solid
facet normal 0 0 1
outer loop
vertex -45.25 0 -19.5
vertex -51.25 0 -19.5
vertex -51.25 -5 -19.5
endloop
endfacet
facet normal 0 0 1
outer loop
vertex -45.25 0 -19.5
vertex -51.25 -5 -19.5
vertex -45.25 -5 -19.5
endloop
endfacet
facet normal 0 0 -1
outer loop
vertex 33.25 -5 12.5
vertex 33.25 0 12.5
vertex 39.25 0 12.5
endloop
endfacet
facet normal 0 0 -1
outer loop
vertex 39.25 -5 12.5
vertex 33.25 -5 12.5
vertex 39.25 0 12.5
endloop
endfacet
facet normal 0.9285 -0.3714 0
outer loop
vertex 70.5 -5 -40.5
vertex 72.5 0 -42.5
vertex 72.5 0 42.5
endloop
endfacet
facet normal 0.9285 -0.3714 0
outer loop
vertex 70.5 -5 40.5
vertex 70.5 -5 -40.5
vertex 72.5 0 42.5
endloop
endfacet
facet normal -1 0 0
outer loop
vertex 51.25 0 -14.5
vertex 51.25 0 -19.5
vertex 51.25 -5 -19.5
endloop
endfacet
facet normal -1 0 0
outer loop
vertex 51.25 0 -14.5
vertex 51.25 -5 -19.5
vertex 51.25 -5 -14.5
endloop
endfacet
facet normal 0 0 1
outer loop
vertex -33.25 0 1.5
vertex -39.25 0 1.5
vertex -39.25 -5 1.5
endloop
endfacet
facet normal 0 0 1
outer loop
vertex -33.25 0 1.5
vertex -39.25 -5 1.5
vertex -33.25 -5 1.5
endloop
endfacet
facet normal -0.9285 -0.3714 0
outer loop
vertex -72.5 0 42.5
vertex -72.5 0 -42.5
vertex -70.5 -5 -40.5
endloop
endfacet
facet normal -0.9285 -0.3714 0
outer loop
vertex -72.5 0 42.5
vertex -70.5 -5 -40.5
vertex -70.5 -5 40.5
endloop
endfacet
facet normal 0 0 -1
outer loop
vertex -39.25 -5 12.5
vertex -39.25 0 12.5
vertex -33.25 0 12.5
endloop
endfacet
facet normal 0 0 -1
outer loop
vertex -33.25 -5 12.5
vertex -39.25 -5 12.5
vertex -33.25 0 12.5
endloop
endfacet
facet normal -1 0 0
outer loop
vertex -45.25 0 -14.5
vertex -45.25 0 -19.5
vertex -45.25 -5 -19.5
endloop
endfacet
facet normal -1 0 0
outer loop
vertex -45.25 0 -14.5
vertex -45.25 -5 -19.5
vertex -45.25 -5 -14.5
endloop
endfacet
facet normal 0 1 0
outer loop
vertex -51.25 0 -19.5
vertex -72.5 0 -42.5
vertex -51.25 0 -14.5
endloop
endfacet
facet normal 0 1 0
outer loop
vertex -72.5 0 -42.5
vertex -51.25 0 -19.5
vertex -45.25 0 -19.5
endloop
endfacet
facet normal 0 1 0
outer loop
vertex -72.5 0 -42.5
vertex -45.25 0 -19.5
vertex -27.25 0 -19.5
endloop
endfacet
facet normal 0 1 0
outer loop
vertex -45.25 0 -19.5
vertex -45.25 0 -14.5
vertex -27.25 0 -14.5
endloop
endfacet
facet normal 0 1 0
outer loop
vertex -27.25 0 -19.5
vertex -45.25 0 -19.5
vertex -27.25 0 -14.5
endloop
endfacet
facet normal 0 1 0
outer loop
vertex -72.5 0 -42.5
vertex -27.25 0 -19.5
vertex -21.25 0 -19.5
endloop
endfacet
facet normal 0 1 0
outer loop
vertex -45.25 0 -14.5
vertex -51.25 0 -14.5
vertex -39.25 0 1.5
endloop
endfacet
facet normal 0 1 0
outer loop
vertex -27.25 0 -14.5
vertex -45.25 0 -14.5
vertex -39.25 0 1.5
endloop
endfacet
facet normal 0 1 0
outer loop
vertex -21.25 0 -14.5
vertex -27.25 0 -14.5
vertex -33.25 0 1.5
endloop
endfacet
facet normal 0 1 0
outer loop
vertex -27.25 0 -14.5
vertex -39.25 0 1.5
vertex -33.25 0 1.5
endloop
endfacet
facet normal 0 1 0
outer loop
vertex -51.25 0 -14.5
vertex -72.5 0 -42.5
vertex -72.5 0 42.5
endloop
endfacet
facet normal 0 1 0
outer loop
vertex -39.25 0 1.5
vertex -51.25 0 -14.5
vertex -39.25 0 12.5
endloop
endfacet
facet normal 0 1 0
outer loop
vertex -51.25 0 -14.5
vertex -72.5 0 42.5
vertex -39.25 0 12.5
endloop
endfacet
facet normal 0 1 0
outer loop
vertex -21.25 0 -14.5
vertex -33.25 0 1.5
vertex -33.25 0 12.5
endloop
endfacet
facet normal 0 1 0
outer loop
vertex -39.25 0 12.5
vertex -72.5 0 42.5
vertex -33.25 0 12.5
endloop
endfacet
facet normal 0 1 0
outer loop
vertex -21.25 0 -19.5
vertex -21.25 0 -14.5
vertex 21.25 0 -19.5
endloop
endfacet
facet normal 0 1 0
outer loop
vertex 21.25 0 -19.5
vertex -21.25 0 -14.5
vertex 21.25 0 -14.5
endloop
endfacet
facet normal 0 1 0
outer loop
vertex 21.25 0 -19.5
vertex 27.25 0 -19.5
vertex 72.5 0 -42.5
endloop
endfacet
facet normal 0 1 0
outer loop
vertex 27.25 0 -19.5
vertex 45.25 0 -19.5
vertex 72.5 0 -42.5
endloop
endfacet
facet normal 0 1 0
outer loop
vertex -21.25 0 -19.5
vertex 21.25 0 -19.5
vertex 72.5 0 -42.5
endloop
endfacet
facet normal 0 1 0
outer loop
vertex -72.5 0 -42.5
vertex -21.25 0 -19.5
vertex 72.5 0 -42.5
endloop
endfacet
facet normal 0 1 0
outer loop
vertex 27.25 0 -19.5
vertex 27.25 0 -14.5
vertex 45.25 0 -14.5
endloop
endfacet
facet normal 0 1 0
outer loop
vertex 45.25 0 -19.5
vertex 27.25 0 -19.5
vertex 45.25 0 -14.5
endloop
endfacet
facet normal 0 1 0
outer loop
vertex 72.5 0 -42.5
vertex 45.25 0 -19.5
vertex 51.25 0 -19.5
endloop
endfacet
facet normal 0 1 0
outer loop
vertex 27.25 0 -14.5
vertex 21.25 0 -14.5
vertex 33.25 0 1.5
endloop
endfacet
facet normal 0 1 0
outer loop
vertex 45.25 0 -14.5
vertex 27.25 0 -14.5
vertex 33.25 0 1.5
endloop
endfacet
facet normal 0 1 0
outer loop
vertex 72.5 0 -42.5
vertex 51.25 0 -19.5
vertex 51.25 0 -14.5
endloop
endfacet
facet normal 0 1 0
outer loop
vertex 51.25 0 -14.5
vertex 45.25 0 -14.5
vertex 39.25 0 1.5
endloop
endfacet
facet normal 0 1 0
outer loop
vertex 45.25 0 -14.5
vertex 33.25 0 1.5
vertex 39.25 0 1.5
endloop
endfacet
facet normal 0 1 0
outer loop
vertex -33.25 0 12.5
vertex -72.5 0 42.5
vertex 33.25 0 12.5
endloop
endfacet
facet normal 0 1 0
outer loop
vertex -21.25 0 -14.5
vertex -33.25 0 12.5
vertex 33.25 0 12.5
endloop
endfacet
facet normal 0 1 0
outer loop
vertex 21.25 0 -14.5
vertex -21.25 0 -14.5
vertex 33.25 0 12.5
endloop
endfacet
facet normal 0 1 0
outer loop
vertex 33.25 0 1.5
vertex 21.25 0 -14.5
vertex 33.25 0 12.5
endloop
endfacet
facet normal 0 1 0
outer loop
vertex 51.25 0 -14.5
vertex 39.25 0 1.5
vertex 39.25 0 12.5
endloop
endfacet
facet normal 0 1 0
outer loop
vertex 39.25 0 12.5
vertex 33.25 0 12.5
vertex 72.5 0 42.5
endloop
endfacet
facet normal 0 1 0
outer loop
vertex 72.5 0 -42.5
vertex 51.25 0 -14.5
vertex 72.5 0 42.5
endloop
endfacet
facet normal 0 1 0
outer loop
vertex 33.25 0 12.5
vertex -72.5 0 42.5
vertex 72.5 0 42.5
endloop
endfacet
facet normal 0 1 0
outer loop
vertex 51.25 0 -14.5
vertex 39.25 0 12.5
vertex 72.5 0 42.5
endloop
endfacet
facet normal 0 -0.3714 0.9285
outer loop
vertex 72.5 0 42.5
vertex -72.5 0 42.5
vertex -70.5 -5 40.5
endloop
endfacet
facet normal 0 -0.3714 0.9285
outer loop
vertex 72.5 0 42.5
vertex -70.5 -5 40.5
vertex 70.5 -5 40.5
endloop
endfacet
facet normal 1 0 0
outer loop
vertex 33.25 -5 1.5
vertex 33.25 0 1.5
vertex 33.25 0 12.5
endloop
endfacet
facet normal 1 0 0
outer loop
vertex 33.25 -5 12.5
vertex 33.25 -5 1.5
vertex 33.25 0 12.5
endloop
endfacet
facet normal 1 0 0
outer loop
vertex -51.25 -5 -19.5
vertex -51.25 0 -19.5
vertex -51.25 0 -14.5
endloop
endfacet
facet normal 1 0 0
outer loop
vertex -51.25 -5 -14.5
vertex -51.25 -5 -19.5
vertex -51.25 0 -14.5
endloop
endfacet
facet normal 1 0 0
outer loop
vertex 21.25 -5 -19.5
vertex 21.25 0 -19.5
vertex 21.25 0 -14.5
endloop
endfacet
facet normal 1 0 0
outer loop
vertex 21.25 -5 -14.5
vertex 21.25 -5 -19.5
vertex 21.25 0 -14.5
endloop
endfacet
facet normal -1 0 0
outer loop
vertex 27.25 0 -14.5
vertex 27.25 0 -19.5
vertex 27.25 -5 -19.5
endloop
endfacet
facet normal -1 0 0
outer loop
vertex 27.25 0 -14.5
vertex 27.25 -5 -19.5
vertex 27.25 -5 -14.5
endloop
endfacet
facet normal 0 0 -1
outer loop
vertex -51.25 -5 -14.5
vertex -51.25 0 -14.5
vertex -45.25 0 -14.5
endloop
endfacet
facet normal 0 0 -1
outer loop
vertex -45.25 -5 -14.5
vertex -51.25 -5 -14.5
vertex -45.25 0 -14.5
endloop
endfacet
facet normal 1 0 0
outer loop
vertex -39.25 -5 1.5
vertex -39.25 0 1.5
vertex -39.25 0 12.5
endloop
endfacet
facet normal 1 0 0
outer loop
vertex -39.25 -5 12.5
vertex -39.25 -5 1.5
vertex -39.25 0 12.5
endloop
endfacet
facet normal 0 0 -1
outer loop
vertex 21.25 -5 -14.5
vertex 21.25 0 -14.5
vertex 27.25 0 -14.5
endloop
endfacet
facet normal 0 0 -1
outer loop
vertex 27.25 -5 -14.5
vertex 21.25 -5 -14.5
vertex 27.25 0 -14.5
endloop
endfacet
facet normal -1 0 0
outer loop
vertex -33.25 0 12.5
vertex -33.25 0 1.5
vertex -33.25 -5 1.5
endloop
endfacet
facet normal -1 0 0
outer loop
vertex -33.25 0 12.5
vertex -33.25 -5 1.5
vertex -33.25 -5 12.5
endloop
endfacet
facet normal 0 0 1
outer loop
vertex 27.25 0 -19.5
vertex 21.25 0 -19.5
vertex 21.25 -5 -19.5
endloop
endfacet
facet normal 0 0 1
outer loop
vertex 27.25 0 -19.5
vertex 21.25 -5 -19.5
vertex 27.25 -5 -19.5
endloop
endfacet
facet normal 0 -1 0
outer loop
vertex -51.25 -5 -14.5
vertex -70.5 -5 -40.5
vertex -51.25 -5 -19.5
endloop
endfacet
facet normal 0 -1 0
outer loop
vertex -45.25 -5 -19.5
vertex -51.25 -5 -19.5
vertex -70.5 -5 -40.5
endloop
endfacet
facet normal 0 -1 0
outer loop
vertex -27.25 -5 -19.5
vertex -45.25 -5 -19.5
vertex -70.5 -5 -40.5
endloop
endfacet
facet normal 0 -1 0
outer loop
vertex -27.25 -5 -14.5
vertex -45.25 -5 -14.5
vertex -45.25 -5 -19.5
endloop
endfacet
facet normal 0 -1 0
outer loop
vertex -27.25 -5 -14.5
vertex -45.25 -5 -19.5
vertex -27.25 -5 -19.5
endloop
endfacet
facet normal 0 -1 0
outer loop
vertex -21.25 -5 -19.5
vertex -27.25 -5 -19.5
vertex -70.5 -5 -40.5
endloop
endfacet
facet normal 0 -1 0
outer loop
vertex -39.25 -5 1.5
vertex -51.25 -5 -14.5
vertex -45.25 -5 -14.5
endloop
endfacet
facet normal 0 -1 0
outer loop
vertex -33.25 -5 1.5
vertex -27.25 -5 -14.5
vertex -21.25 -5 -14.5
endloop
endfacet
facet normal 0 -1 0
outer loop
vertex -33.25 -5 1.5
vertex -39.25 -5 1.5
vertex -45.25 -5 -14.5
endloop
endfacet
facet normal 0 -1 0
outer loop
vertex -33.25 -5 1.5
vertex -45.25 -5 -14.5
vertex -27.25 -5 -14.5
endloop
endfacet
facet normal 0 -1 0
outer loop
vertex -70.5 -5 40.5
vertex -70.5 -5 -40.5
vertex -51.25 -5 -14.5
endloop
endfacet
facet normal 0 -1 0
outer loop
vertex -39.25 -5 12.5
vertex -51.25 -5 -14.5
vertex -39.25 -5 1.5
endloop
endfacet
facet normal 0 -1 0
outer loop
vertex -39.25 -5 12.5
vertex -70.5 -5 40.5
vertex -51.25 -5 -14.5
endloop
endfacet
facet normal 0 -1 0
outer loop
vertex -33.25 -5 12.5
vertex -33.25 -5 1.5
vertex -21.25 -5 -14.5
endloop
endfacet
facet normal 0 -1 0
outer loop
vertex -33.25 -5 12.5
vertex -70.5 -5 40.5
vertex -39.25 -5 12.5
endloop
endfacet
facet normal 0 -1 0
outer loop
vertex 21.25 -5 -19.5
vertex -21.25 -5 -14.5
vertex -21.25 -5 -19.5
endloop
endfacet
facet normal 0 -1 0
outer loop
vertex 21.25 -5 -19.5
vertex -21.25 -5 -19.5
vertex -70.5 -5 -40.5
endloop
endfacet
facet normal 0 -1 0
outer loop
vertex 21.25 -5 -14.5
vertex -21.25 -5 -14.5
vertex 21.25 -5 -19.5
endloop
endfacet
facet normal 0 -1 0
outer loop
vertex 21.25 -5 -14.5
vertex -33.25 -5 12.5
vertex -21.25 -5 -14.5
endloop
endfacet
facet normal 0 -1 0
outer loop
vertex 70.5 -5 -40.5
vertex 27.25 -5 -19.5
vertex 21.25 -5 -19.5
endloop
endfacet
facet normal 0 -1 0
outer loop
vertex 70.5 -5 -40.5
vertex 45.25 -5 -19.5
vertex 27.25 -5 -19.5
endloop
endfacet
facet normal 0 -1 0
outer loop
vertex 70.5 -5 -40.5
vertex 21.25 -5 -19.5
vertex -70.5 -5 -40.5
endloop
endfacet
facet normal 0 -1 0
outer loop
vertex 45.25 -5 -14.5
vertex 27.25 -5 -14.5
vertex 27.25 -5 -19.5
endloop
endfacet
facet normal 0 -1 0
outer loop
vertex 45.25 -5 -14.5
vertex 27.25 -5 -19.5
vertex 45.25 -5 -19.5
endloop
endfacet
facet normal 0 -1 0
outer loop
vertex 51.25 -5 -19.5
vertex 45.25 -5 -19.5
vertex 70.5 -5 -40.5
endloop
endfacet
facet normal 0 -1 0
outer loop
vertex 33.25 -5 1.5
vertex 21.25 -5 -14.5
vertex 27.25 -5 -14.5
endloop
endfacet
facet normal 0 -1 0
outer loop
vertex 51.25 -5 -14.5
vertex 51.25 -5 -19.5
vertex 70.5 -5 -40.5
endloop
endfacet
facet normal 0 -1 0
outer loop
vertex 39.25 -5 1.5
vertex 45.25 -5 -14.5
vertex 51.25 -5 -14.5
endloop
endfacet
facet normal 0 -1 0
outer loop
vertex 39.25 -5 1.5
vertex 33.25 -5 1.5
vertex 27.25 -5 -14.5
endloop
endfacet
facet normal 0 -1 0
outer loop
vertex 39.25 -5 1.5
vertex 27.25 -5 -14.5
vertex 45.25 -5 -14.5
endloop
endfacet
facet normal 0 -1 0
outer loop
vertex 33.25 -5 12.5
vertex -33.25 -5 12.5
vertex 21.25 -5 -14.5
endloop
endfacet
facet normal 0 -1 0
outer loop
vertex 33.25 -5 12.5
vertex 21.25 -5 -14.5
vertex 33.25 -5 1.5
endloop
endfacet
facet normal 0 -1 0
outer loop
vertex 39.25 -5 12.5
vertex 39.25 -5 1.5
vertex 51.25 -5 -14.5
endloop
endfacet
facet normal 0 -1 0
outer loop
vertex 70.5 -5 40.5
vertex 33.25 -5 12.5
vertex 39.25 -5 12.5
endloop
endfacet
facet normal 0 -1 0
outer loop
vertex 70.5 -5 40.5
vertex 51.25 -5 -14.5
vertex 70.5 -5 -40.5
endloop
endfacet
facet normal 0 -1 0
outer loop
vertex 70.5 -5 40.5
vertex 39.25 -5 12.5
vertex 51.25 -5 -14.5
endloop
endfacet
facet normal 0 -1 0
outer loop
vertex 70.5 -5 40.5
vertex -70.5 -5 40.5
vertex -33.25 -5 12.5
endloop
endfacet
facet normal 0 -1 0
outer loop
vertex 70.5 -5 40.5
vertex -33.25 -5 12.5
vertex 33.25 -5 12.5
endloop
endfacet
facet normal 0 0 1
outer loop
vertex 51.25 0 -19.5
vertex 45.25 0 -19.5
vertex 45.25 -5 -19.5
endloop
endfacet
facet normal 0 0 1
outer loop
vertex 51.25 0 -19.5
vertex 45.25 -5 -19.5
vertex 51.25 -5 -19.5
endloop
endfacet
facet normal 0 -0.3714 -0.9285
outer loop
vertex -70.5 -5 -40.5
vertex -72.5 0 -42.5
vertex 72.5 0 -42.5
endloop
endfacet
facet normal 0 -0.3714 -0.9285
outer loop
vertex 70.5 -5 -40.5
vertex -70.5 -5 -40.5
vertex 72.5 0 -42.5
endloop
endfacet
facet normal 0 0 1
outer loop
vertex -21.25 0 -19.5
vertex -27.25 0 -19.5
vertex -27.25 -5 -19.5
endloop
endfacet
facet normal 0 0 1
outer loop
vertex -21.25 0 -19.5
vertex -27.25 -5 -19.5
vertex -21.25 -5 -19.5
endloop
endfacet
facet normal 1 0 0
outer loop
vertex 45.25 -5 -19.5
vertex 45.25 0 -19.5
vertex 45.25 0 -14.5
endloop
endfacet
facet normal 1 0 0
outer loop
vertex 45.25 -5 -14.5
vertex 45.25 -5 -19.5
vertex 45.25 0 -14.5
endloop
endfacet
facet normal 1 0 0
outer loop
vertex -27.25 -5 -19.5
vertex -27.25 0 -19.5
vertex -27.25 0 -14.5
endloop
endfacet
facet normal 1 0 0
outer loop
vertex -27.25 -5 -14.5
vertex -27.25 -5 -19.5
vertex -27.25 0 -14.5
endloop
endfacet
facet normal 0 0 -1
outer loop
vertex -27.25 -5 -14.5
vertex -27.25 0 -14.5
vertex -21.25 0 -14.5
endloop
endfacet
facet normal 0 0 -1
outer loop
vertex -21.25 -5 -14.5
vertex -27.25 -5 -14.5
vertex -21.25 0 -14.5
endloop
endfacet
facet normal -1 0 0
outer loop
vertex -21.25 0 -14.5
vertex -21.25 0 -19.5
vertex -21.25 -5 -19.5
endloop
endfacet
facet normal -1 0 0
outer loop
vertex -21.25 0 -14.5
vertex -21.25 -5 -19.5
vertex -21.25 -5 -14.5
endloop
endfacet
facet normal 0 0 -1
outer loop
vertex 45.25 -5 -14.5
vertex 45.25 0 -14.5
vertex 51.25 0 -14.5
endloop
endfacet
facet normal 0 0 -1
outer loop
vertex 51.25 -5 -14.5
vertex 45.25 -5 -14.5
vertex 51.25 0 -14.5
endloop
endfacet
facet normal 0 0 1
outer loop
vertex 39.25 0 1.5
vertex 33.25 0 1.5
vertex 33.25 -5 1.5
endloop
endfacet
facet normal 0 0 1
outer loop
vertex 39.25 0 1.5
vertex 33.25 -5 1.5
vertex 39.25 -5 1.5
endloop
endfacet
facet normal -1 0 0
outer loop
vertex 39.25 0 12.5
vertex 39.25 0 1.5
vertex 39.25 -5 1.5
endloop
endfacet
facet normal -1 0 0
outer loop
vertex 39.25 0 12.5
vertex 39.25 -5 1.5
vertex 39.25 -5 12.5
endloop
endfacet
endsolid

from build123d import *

# Parameters (mm, degrees)
F0_W     = 145
F0_H     = 85
F1_DEPTH = 5
F2_W     = 6
F2_H     = 11
F2_H_2   = 5
F3_DEPTH = 5
F4_SIZE2 = 4.99999
F4_SIZE  = 1.99999


# Not quite as in the source:
# - a fillet or chamfer is up to 0.001 mm smaller than in the source, because OpenCascade refuses the exact size


with BuildPart() as f1:
    # F0 (on Front) → F1 (new body)
    with BuildSketch(Plane.XZ):
        Rectangle(F0_W, F0_H)
    extrude(amount=F1_DEPTH)

    # F2 (on Front) → F3 (cut, through all)
    with BuildSketch(Plane.XZ):
        with Locations((-36.25, 7)):
            Rectangle(F2_W, F2_H)
        with Locations((-48.25, -17)):
            Rectangle(F2_W, F2_H_2)
        with Locations((-24.25, -17)):
            Rectangle(F2_W, F2_H_2)
        with Locations((36.25, 7)):
            Rectangle(F2_W, F2_H)
        with Locations((48.25, -17)):
            Rectangle(F2_W, F2_H_2)
        with Locations((24.25, -17)):
            Rectangle(F2_W, F2_H_2)
    extrude(amount=F3_DEPTH, mode=Mode.SUBTRACT)

    # F4 (size 2 and 5 in the source; OpenCascade refuses exactly that, so slightly less here)
    f4_edges = [f1.edges().sort_by_distance(p)[0] for p in [
        (0, -5, 42.5),
        (-72.5, -5, 0),
        (0, -5, -42.5),
        (72.5, -5, 0),
    ]]
    f4_side = f1.faces().sort_by_distance((0, -5, 0.092438))[0]
    chamfer(f4_edges, length=F4_SIZE, length2=F4_SIZE2, reference=f4_side)


solid = f1.part
